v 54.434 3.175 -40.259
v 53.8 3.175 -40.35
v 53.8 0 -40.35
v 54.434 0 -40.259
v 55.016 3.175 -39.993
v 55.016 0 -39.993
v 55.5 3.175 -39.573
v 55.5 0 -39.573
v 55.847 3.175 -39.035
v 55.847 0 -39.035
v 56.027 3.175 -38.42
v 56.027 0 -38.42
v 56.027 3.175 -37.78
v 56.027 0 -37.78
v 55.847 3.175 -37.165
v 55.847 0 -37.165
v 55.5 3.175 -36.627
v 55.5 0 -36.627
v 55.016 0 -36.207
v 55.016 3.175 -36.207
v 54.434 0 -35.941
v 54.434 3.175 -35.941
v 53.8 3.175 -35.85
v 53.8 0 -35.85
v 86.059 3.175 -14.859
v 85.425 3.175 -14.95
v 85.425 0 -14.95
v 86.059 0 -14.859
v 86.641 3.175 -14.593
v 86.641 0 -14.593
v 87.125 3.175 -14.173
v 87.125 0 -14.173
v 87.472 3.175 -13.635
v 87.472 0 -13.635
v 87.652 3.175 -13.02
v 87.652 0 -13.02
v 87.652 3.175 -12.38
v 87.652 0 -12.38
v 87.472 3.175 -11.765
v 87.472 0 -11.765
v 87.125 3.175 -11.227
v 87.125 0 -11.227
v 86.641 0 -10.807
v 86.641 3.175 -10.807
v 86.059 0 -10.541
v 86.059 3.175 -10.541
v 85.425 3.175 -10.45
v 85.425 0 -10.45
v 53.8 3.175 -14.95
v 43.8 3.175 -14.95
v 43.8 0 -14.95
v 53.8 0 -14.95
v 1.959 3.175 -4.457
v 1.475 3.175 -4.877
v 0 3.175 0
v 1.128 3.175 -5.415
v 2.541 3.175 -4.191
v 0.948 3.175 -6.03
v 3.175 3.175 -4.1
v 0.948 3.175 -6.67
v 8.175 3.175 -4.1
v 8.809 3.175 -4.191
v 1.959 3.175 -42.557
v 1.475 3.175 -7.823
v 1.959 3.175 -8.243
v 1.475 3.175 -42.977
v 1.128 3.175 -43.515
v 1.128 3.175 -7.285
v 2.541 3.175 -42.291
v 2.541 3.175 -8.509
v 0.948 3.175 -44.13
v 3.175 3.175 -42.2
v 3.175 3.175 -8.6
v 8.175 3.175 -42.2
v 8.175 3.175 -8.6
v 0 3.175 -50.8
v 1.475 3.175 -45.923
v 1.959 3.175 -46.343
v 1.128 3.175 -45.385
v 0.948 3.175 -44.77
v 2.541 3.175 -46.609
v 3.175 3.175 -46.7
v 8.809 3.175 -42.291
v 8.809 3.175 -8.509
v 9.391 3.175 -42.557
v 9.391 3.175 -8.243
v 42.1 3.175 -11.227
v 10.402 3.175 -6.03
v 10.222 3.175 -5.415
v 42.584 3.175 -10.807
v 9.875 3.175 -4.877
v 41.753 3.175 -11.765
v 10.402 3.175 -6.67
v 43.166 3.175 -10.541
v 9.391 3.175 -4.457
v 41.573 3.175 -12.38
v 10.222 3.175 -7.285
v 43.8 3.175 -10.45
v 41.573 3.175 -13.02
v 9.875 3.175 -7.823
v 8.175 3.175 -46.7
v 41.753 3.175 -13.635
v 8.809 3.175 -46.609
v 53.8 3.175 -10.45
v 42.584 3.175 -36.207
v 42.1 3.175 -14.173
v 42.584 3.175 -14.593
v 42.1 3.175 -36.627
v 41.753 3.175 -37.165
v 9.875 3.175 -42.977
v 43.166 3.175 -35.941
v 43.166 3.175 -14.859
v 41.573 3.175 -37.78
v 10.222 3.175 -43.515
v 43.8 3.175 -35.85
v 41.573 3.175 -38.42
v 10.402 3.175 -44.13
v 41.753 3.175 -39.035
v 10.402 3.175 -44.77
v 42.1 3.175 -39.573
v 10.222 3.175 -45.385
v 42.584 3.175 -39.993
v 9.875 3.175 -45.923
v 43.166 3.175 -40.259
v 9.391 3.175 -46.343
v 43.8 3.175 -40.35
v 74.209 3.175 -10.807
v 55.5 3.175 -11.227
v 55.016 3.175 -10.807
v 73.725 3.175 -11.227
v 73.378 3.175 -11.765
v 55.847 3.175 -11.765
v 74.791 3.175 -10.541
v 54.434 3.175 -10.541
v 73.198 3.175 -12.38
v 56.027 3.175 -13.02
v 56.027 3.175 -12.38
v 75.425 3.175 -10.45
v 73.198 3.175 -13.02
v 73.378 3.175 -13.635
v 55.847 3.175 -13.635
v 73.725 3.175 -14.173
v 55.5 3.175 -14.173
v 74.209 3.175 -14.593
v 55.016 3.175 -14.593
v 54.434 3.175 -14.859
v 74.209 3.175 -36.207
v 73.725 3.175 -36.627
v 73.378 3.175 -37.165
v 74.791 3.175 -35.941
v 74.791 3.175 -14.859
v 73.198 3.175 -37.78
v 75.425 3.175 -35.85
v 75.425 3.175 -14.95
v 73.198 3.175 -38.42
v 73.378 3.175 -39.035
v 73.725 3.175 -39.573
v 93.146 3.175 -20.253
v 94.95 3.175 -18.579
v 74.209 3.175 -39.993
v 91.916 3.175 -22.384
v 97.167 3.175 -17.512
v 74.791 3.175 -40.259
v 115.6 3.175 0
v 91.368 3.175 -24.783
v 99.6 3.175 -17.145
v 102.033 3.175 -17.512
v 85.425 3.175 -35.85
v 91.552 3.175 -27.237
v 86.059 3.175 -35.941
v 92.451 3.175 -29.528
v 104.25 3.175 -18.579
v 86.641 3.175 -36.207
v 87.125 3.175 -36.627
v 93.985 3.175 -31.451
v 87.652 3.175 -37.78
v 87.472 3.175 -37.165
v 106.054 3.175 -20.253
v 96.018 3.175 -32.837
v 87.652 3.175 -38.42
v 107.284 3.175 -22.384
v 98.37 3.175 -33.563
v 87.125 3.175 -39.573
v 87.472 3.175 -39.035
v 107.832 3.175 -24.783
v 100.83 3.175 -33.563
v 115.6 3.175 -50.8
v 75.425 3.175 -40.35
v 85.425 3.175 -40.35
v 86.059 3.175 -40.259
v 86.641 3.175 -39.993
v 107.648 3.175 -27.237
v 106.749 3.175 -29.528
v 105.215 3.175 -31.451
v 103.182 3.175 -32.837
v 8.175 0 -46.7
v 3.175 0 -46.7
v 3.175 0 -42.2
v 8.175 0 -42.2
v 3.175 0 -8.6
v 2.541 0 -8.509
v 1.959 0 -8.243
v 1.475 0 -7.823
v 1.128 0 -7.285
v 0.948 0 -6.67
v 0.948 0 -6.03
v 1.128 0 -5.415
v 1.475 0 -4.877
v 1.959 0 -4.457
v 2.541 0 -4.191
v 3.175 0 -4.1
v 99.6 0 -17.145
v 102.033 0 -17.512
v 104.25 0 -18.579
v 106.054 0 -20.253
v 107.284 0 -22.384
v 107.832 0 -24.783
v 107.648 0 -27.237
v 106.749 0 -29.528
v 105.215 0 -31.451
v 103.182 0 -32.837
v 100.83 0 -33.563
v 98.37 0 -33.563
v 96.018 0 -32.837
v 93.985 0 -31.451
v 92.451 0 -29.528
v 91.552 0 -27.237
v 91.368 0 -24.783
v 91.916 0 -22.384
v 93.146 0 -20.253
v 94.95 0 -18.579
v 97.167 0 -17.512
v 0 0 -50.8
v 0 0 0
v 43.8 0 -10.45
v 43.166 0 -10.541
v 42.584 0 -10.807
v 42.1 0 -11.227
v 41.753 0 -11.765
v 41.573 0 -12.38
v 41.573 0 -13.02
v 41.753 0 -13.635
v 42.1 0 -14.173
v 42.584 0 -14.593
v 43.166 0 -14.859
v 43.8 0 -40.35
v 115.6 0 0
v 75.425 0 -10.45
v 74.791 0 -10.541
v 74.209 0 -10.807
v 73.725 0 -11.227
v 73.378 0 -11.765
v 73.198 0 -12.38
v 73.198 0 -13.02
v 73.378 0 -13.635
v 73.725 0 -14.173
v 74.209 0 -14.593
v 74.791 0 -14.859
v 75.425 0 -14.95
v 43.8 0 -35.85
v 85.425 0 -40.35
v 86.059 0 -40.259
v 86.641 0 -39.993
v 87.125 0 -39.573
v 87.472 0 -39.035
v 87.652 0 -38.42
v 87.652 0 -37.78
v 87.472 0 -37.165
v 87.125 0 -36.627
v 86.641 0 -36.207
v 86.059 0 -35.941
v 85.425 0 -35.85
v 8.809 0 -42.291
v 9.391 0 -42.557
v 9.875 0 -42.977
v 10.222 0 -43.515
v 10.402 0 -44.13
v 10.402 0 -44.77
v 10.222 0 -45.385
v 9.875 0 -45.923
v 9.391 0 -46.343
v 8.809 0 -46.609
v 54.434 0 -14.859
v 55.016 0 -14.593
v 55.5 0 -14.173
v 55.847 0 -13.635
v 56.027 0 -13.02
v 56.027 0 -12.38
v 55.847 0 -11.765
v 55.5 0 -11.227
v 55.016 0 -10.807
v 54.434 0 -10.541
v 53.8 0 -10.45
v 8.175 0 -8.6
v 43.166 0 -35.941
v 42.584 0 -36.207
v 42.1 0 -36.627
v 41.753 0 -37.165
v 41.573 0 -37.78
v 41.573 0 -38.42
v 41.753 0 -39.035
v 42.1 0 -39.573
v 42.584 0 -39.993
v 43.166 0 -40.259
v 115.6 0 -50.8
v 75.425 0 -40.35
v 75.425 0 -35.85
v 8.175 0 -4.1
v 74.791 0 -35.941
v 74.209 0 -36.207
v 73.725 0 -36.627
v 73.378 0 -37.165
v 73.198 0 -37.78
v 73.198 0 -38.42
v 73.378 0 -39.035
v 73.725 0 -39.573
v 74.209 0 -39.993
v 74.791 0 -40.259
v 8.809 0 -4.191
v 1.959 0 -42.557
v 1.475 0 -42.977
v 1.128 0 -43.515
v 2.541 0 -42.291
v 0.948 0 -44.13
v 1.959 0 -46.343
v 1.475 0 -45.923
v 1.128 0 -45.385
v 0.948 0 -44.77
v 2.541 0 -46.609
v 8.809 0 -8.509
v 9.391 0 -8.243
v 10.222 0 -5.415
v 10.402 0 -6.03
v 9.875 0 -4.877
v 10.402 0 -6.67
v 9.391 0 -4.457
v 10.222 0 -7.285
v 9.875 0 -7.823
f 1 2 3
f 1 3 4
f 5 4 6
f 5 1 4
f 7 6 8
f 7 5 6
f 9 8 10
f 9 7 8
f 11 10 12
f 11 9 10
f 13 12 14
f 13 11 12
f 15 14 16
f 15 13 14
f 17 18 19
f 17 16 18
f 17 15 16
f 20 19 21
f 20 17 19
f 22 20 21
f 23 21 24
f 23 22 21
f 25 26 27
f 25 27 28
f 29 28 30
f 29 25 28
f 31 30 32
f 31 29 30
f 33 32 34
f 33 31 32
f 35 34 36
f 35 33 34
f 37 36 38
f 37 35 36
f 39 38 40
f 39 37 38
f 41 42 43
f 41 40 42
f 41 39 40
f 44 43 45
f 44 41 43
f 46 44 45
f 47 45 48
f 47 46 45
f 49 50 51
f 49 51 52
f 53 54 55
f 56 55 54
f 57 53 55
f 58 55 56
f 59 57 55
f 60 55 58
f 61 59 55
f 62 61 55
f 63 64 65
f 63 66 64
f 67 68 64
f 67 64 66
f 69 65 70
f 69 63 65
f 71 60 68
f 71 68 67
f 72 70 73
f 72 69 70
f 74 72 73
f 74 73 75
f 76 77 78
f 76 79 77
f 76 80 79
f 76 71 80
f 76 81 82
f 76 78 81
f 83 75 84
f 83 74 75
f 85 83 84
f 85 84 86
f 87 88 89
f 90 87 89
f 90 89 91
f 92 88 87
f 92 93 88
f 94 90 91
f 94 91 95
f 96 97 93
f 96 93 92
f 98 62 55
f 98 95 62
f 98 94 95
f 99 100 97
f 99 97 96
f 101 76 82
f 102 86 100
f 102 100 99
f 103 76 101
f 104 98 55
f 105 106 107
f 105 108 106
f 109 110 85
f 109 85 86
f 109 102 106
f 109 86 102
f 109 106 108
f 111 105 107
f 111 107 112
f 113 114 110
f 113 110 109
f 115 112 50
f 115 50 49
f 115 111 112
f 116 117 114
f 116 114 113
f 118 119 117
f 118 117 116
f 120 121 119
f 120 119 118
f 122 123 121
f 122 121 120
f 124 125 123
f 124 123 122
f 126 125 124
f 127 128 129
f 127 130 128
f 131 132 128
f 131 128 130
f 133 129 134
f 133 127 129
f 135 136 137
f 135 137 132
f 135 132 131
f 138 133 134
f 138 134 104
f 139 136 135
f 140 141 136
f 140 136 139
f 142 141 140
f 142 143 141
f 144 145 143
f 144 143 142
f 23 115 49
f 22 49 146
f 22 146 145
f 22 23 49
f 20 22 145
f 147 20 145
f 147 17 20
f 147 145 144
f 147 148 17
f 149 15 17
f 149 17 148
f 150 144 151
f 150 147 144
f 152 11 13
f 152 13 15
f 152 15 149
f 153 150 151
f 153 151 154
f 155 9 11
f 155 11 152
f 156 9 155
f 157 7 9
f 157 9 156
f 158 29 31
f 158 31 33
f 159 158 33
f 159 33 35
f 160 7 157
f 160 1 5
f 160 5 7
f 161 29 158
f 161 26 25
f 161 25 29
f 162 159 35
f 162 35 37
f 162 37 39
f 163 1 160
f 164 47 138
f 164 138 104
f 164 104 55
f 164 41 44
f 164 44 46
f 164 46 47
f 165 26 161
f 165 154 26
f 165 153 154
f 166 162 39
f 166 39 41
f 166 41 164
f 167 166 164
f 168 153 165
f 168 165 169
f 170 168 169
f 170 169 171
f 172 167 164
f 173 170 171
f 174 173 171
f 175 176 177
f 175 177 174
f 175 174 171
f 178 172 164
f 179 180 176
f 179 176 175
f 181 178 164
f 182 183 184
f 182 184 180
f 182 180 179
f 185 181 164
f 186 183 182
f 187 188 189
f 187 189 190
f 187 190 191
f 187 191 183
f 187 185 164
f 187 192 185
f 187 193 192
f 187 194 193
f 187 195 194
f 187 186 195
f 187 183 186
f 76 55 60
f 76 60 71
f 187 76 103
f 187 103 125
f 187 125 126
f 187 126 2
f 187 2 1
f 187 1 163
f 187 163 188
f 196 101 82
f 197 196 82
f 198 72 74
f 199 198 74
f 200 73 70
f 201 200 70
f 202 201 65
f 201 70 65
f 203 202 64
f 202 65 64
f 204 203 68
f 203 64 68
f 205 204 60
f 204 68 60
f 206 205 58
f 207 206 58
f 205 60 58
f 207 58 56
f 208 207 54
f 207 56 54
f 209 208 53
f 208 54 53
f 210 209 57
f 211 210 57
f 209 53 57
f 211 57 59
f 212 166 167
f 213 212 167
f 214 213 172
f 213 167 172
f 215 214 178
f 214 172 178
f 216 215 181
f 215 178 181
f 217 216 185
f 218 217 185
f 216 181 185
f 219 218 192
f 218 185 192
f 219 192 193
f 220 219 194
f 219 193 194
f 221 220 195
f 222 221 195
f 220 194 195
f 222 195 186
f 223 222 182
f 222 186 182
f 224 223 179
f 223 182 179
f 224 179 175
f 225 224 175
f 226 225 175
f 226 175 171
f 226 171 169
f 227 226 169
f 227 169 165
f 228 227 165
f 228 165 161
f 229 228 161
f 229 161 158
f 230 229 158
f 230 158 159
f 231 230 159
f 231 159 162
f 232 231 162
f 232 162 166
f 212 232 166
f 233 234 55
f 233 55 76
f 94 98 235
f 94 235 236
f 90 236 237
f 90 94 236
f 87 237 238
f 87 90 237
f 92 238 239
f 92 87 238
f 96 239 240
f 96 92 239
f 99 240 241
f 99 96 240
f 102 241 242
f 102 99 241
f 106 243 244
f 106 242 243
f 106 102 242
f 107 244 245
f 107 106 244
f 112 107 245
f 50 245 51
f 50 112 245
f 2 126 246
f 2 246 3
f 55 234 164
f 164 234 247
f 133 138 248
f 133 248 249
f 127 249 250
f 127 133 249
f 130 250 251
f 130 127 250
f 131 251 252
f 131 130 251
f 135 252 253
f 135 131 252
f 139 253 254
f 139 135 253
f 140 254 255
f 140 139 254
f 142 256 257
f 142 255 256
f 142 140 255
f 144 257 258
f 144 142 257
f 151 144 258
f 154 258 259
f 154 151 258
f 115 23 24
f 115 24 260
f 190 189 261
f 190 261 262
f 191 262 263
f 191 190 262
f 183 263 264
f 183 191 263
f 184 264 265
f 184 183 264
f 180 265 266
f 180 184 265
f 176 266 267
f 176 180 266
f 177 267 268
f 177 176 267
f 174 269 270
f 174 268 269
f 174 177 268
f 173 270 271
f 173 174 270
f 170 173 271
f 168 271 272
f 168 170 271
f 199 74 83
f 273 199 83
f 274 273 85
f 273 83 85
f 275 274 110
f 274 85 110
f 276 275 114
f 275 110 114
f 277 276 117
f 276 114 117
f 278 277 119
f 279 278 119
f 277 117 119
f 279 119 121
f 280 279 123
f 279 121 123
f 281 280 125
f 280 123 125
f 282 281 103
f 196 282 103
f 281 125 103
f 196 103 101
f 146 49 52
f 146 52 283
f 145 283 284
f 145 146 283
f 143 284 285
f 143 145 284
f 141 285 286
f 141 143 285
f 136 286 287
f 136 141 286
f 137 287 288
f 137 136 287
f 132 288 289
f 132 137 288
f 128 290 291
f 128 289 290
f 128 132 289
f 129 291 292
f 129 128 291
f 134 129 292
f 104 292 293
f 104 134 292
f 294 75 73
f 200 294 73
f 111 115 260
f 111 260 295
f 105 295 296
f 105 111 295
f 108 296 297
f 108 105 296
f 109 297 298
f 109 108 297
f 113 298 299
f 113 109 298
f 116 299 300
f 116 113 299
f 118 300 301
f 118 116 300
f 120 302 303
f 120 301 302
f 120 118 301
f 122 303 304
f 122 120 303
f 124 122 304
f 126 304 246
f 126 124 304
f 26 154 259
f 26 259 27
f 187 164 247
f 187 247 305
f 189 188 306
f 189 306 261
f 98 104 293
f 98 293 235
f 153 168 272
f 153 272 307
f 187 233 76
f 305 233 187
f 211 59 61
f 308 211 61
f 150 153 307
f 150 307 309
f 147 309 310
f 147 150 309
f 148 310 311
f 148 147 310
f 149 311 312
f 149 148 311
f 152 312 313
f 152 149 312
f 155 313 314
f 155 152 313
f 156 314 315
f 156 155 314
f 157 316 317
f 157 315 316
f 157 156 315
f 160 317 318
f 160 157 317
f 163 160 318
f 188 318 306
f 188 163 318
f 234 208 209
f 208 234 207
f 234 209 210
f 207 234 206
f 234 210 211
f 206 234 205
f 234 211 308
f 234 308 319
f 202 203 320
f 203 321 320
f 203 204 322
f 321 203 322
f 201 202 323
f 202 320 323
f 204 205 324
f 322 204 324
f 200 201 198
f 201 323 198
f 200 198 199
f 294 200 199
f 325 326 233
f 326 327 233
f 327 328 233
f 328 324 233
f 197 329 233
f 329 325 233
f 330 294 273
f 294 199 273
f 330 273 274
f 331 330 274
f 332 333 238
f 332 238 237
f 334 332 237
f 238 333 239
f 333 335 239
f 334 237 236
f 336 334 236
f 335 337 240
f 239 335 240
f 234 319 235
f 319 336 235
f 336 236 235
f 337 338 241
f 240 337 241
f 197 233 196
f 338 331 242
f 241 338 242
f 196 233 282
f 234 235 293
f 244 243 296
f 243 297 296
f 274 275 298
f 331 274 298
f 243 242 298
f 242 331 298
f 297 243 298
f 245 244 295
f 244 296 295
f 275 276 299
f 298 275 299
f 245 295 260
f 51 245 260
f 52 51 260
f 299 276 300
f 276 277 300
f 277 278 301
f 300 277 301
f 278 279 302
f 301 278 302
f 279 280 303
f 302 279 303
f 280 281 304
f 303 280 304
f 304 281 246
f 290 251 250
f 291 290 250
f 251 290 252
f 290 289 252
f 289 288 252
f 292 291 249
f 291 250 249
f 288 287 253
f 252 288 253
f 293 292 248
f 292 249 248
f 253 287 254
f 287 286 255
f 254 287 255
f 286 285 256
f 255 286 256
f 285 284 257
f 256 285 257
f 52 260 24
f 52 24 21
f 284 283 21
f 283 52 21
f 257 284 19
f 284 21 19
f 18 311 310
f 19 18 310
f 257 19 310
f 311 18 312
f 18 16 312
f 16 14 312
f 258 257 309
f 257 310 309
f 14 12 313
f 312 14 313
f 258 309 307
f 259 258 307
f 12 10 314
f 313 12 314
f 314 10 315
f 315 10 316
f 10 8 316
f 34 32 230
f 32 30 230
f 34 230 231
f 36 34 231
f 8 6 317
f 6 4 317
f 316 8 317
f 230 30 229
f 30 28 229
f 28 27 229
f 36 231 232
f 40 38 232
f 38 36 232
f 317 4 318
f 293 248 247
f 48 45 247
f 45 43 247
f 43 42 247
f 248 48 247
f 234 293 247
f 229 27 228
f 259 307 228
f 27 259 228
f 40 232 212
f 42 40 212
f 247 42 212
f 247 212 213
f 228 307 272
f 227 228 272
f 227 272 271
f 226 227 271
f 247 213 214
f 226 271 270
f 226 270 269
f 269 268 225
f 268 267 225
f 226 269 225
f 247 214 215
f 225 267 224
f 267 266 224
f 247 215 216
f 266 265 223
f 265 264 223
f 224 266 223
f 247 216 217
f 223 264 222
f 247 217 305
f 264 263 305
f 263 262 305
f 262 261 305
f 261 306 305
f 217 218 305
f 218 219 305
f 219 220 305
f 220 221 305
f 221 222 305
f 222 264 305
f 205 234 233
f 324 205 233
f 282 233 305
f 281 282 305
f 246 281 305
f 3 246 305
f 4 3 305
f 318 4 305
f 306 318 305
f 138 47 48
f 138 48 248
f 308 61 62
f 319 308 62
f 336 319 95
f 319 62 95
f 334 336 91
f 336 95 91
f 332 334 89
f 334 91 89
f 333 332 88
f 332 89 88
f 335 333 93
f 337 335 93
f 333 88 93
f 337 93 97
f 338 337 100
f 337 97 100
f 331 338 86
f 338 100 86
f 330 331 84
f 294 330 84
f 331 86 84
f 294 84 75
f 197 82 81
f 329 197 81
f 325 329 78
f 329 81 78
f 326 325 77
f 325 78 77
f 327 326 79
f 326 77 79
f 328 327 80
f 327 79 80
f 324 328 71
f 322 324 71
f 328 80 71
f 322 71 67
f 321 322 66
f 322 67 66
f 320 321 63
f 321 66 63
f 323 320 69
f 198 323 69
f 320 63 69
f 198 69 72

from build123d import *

# Parameters (mm, degrees)
SKETCH1_W           = 125
SKETCH1_H           = 50.8
BOSS_EXTRUDE1_DEPTH = 3.175
SKETCH2_R           = 8.255
CUT_EXTRUDE1_DEPTH  = 135.965627569
SKETCH3_W           = 9.4
SKETCH3_H           = 50.8
CUT_EXTRUDE2_DEPTH  = 10


with BuildPart() as part:
    # Sketch1 → Boss-Extrude1 (new body)
    with BuildSketch(Plane(origin=(0, 0, 0), x_dir=(1, 0, 0), z_dir=(0, 1, 0))):
        with Locations((62.5, 25.4)):
            Rectangle(SKETCH1_W, SKETCH1_H)
    extrude(amount=BOSS_EXTRUDE1_DEPTH)

    # Sketch2 → Cut-Extrude1 (cut, through all)
    with BuildSketch(Plane(origin=(0, 3.175, 0), x_dir=(1, 0, 0), z_dir=(0, 1, 0))):
        with Locations(Location((99.6, 25.4, 0), (0, 0, 270))):
            Circle(SKETCH2_R)
        with BuildLine():
            Line((3.175, 42.2), (8.175, 42.2))
            ThreePointArc((8.175, 42.2), (10.425, 44.45), (8.175, 46.7))
            Line((8.175, 46.7), (3.175, 46.7))
            ThreePointArc((3.175, 46.7), (0.925, 44.45), (3.175, 42.2))
        make_face()
        with BuildLine():
            Line((3.175, 4.1), (8.175, 4.1))
            ThreePointArc((8.175, 4.1), (10.425, 6.35), (8.175, 8.6))
            Line((8.175, 8.6), (3.175, 8.6))
            ThreePointArc((3.175, 8.6), (0.925, 6.35), (3.175, 4.1))
        make_face()
        with BuildLine():
            Line((80.425, 40.35), (85.425, 40.35))
            ThreePointArc((85.425, 40.35), (87.675, 38.1), (85.425, 35.85))
            Line((85.425, 35.85), (80.425, 35.85))
            Line((80.425, 35.85), (75.425, 35.85))
            ThreePointArc((75.425, 35.85), (73.175, 38.1), (75.425, 40.35))
            Line((75.425, 40.35), (80.425, 40.35))
        make_face()
        with BuildLine():
            Line((48.8, 35.85), (43.8, 35.85))
            ThreePointArc((43.8, 35.85), (41.55, 38.1), (43.8, 40.35))
            Line((43.8, 40.35), (48.8, 40.35))
            Line((48.8, 40.35), (53.8, 40.35))
            ThreePointArc((53.8, 40.35), (56.05, 38.1), (53.8, 35.85))
            Line((53.8, 35.85), (48.8, 35.85))
        make_face()
        with BuildLine():
            Line((48.8, 10.45), (43.8, 10.45))
            ThreePointArc((43.8, 10.45), (41.55, 12.7), (43.8, 14.95))
            Line((43.8, 14.95), (48.8, 14.95))
            Line((48.8, 14.95), (53.8, 14.95))
            ThreePointArc((53.8, 14.95), (56.05, 12.7), (53.8, 10.45))
            Line((53.8, 10.45), (48.8, 10.45))
        make_face()
        with BuildLine():
            Line((80.425, 10.45), (75.425, 10.45))
            ThreePointArc((75.425, 10.45), (73.175, 12.7), (75.425, 14.95))
            Line((75.425, 14.95), (80.425, 14.95))
            Line((80.425, 14.95), (85.425, 14.95))
            ThreePointArc((85.425, 14.95), (87.675, 12.7), (85.425, 10.45))
            Line((85.425, 10.45), (80.425, 10.45))
        make_face()
    extrude(amount=-CUT_EXTRUDE1_DEPTH, mode=Mode.SUBTRACT)

    # Sketch3 → Cut-Extrude2 (cut)
    with BuildSketch(Plane(origin=(0, 3.175, 0), x_dir=(1, 0, 0), z_dir=(0, 1, 0))):
        with Locations((120.3, 25.4)):
            Rectangle(SKETCH3_W, SKETCH3_H)
    extrude(amount=-CUT_EXTRUDE2_DEPTH, mode=Mode.SUBTRACT)


solid = part.part
